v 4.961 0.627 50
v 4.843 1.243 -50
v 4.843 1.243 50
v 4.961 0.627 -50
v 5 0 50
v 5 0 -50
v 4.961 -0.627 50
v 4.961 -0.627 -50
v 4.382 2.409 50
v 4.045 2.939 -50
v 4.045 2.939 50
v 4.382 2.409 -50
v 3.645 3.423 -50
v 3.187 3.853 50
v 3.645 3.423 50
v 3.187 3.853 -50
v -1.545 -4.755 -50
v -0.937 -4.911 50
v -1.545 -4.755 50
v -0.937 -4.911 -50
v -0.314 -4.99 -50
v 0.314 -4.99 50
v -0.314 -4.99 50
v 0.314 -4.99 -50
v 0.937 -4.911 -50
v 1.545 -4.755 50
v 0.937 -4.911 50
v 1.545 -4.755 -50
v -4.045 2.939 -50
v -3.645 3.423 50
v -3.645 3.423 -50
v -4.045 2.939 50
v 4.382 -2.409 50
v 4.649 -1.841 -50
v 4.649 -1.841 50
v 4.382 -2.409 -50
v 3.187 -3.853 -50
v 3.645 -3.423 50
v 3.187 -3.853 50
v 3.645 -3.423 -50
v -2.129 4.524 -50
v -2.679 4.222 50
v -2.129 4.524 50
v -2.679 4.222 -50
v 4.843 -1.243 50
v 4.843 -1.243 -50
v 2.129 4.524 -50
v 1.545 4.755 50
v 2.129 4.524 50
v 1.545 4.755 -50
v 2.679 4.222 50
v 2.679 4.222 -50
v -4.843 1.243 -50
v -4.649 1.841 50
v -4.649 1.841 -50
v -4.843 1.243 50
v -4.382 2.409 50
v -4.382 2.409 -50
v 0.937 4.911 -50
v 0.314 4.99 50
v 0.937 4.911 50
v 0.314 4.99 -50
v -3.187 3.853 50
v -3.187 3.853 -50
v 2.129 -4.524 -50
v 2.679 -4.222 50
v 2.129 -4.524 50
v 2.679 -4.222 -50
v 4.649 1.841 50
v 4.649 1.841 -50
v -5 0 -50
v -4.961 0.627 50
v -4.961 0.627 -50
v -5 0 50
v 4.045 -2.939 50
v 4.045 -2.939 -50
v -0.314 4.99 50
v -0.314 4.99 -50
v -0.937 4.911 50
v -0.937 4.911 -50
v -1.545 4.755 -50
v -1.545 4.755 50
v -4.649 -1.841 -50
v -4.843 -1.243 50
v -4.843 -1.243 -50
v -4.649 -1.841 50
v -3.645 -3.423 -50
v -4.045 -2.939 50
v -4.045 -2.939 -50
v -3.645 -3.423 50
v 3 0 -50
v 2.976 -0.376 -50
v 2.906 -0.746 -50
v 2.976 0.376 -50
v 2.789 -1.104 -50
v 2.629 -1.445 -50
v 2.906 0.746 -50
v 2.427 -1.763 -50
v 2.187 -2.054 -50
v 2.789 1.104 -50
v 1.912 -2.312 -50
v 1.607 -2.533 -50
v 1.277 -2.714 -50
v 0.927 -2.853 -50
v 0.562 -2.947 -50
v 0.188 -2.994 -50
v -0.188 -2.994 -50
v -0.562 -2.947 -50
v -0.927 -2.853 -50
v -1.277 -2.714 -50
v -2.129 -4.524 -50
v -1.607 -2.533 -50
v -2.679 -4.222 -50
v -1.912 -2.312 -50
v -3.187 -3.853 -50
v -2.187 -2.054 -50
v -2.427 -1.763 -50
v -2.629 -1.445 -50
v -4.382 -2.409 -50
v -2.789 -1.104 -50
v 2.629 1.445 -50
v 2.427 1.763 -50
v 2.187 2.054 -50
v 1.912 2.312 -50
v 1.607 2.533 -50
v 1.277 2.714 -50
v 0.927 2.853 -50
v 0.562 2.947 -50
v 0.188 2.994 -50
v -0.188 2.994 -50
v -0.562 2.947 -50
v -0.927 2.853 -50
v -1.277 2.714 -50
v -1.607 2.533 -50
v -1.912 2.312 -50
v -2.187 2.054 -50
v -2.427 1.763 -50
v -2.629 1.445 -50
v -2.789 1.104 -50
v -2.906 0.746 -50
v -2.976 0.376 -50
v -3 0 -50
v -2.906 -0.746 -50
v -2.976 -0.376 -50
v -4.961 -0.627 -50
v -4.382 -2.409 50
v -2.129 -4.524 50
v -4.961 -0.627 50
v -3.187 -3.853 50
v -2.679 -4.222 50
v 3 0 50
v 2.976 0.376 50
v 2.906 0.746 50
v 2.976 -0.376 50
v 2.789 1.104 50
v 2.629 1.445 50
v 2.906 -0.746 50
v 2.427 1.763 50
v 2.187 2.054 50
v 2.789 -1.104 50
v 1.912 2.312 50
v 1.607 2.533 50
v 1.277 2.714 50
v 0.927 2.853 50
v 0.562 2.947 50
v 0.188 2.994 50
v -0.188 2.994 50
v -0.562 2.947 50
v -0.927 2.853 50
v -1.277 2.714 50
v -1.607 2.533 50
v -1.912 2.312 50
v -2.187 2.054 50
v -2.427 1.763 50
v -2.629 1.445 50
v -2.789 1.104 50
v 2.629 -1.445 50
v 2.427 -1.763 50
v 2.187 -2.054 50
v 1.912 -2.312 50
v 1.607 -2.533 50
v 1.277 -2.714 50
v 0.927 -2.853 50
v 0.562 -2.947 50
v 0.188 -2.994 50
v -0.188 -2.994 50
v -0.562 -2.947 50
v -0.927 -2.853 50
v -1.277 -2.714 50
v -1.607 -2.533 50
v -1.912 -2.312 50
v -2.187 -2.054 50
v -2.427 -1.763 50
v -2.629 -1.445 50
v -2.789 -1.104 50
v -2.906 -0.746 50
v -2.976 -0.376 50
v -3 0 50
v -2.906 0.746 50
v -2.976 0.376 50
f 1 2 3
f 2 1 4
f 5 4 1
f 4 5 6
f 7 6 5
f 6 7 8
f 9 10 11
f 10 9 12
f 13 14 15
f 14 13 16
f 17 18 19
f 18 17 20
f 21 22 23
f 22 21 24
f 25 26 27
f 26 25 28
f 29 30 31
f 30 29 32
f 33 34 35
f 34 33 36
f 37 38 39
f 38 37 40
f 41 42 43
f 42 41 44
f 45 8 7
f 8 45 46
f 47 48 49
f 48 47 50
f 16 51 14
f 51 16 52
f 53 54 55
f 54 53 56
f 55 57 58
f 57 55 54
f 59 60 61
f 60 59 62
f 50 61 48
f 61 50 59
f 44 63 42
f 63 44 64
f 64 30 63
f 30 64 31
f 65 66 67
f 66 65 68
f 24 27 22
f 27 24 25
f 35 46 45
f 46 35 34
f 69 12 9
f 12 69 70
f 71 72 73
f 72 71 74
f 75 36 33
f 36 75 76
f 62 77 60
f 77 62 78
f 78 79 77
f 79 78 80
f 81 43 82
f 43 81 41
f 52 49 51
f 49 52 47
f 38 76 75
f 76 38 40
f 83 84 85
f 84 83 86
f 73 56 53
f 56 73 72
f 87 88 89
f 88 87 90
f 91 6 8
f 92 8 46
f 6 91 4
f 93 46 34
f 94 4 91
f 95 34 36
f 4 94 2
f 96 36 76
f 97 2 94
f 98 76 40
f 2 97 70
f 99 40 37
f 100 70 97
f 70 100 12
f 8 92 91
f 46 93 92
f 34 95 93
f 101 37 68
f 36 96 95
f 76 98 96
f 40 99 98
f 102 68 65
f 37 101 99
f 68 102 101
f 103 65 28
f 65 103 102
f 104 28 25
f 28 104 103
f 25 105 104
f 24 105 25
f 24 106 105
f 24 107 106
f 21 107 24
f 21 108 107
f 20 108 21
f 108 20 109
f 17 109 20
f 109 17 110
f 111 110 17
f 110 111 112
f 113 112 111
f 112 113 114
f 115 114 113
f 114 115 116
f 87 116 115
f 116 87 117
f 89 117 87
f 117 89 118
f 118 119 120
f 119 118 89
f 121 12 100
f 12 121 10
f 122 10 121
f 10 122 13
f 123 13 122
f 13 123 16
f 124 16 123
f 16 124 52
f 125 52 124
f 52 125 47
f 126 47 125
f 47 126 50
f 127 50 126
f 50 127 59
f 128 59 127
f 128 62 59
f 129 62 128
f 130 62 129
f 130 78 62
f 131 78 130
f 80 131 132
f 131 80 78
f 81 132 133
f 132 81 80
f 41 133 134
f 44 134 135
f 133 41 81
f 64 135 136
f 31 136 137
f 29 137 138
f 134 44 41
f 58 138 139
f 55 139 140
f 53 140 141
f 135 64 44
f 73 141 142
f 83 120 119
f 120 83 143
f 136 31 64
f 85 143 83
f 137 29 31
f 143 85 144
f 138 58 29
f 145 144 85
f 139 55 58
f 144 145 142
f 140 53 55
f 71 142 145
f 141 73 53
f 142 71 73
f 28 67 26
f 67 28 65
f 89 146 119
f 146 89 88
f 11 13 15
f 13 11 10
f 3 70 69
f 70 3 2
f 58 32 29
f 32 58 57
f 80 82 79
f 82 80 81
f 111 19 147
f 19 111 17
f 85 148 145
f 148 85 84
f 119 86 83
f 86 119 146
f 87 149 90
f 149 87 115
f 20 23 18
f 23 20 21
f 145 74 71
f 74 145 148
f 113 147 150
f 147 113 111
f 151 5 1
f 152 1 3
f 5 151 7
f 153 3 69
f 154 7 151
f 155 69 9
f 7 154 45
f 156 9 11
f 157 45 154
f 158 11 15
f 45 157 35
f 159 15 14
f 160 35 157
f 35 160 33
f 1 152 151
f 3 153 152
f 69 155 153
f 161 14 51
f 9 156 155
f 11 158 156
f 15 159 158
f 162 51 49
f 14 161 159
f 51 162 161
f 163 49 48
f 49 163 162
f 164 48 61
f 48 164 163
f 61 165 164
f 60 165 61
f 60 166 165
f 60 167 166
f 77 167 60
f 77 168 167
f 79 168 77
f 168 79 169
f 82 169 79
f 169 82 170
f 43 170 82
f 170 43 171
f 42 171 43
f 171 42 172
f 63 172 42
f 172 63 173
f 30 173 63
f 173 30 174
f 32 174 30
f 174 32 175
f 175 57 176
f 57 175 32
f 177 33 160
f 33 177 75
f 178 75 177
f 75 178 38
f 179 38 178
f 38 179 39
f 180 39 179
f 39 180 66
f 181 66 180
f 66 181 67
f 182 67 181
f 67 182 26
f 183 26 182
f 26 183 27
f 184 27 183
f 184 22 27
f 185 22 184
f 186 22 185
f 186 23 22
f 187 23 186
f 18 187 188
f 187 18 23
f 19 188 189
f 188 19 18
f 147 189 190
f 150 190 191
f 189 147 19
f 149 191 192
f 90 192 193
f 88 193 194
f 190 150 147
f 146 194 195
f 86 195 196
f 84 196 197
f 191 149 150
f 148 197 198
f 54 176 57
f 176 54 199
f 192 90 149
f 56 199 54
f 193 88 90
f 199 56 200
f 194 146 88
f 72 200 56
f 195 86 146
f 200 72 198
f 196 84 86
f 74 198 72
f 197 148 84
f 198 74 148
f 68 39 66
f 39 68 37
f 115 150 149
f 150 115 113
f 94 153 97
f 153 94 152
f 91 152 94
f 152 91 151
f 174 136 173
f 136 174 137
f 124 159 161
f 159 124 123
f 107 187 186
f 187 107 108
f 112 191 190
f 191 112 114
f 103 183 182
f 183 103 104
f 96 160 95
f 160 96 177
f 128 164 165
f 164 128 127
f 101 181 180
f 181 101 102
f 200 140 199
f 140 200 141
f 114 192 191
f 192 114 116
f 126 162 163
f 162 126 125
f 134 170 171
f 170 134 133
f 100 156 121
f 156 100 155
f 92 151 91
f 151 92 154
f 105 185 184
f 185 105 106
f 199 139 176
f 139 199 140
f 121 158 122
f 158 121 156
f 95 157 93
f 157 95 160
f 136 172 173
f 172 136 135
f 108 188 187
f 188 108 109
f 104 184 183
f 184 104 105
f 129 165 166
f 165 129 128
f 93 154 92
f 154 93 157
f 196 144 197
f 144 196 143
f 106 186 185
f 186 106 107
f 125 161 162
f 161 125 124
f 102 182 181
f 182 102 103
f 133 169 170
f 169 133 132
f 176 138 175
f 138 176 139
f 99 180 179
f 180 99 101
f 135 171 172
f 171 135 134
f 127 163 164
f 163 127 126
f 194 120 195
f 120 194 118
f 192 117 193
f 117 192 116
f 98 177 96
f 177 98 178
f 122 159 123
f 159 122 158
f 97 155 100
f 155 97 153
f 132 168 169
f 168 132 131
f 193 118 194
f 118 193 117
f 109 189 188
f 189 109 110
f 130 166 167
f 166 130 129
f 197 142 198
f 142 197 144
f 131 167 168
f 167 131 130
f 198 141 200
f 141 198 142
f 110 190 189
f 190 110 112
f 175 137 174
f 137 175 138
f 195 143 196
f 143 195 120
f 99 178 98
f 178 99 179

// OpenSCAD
$fn = 50;


difference() {
	union() {
		translate(v = [0, 0, -50.0000000000]) {
			cylinder(h = 100, r = 5.0000000000);
		}
	}
	union() {
		translate(v = [0, 0, -100.0000000000]) {
			cylinder(h = 200, r = 3.0000000000);
		}
	}
}
